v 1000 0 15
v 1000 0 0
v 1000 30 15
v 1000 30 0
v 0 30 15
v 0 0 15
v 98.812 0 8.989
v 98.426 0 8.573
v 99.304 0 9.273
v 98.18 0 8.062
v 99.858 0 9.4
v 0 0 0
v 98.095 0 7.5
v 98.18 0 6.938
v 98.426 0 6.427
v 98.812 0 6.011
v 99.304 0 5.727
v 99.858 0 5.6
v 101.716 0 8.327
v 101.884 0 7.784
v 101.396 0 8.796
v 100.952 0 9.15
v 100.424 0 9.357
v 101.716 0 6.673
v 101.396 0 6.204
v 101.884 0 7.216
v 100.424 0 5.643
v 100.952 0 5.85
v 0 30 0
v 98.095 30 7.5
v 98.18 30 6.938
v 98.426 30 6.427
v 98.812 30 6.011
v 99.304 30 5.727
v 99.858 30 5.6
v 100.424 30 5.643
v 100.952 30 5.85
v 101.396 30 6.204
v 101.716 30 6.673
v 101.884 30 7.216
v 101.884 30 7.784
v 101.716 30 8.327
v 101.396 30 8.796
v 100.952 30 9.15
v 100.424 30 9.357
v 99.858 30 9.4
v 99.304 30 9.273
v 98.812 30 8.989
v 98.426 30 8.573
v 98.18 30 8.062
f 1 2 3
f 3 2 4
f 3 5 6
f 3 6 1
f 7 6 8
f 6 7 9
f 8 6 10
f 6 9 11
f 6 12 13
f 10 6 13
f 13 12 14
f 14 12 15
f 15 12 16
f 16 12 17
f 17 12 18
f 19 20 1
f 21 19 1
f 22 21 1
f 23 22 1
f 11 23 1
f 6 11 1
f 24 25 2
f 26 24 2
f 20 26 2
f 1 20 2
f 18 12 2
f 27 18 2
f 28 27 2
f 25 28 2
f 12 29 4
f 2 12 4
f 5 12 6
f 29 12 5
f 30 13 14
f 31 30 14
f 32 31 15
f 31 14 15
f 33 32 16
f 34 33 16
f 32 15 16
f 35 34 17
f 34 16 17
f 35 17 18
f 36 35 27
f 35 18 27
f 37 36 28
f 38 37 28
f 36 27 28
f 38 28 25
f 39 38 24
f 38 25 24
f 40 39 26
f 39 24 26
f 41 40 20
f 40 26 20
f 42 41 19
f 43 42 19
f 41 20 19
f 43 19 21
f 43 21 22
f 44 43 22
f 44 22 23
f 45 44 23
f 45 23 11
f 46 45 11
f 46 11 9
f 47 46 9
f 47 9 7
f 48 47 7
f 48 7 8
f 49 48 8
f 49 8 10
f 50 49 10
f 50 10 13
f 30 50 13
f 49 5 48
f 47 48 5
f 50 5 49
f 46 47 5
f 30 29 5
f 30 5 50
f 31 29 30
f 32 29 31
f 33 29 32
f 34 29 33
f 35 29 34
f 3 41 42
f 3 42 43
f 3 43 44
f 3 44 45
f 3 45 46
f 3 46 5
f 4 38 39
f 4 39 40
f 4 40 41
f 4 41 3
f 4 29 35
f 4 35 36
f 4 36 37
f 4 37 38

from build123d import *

# Parameters (mm, degrees)
SKETCH1_W                      = 100
SKETCH1_H                      = 3
BOSS_EXTRUDE1_DEPTH            = 1.5
SCALE1_SCALE                   = 10
F_6_0_204_DIAMETER_HOLE1_D     = 3.81
F_6_0_204_DIAMETER_HOLE1_DEPTH = 49


with BuildPart() as part:
    # Sketch1 → Boss-Extrude1 (new body)
    with BuildSketch(Plane.XY):
        with Locations((50, 1.5)):
            Rectangle(SKETCH1_W, SKETCH1_H)
    extrude(amount=BOSS_EXTRUDE1_DEPTH)


with BuildPart() as part_1:
    # Scale1: scaled about (0, 0, 0)
    add(part.part.scale(SCALE1_SCALE))

    # #6 (0.204) Diameter Hole1
    with Locations(Plane(origin=(-109.418477494, 30, -1000), x_dir=(1, 0, 0), z_dir=(0, 1, 0))):
        with Locations((209.418477494, -1007.5)):
            Hole(F_6_0_204_DIAMETER_HOLE1_D / 2, depth=F_6_0_204_DIAMETER_HOLE1_DEPTH)


solid = part_1.part
